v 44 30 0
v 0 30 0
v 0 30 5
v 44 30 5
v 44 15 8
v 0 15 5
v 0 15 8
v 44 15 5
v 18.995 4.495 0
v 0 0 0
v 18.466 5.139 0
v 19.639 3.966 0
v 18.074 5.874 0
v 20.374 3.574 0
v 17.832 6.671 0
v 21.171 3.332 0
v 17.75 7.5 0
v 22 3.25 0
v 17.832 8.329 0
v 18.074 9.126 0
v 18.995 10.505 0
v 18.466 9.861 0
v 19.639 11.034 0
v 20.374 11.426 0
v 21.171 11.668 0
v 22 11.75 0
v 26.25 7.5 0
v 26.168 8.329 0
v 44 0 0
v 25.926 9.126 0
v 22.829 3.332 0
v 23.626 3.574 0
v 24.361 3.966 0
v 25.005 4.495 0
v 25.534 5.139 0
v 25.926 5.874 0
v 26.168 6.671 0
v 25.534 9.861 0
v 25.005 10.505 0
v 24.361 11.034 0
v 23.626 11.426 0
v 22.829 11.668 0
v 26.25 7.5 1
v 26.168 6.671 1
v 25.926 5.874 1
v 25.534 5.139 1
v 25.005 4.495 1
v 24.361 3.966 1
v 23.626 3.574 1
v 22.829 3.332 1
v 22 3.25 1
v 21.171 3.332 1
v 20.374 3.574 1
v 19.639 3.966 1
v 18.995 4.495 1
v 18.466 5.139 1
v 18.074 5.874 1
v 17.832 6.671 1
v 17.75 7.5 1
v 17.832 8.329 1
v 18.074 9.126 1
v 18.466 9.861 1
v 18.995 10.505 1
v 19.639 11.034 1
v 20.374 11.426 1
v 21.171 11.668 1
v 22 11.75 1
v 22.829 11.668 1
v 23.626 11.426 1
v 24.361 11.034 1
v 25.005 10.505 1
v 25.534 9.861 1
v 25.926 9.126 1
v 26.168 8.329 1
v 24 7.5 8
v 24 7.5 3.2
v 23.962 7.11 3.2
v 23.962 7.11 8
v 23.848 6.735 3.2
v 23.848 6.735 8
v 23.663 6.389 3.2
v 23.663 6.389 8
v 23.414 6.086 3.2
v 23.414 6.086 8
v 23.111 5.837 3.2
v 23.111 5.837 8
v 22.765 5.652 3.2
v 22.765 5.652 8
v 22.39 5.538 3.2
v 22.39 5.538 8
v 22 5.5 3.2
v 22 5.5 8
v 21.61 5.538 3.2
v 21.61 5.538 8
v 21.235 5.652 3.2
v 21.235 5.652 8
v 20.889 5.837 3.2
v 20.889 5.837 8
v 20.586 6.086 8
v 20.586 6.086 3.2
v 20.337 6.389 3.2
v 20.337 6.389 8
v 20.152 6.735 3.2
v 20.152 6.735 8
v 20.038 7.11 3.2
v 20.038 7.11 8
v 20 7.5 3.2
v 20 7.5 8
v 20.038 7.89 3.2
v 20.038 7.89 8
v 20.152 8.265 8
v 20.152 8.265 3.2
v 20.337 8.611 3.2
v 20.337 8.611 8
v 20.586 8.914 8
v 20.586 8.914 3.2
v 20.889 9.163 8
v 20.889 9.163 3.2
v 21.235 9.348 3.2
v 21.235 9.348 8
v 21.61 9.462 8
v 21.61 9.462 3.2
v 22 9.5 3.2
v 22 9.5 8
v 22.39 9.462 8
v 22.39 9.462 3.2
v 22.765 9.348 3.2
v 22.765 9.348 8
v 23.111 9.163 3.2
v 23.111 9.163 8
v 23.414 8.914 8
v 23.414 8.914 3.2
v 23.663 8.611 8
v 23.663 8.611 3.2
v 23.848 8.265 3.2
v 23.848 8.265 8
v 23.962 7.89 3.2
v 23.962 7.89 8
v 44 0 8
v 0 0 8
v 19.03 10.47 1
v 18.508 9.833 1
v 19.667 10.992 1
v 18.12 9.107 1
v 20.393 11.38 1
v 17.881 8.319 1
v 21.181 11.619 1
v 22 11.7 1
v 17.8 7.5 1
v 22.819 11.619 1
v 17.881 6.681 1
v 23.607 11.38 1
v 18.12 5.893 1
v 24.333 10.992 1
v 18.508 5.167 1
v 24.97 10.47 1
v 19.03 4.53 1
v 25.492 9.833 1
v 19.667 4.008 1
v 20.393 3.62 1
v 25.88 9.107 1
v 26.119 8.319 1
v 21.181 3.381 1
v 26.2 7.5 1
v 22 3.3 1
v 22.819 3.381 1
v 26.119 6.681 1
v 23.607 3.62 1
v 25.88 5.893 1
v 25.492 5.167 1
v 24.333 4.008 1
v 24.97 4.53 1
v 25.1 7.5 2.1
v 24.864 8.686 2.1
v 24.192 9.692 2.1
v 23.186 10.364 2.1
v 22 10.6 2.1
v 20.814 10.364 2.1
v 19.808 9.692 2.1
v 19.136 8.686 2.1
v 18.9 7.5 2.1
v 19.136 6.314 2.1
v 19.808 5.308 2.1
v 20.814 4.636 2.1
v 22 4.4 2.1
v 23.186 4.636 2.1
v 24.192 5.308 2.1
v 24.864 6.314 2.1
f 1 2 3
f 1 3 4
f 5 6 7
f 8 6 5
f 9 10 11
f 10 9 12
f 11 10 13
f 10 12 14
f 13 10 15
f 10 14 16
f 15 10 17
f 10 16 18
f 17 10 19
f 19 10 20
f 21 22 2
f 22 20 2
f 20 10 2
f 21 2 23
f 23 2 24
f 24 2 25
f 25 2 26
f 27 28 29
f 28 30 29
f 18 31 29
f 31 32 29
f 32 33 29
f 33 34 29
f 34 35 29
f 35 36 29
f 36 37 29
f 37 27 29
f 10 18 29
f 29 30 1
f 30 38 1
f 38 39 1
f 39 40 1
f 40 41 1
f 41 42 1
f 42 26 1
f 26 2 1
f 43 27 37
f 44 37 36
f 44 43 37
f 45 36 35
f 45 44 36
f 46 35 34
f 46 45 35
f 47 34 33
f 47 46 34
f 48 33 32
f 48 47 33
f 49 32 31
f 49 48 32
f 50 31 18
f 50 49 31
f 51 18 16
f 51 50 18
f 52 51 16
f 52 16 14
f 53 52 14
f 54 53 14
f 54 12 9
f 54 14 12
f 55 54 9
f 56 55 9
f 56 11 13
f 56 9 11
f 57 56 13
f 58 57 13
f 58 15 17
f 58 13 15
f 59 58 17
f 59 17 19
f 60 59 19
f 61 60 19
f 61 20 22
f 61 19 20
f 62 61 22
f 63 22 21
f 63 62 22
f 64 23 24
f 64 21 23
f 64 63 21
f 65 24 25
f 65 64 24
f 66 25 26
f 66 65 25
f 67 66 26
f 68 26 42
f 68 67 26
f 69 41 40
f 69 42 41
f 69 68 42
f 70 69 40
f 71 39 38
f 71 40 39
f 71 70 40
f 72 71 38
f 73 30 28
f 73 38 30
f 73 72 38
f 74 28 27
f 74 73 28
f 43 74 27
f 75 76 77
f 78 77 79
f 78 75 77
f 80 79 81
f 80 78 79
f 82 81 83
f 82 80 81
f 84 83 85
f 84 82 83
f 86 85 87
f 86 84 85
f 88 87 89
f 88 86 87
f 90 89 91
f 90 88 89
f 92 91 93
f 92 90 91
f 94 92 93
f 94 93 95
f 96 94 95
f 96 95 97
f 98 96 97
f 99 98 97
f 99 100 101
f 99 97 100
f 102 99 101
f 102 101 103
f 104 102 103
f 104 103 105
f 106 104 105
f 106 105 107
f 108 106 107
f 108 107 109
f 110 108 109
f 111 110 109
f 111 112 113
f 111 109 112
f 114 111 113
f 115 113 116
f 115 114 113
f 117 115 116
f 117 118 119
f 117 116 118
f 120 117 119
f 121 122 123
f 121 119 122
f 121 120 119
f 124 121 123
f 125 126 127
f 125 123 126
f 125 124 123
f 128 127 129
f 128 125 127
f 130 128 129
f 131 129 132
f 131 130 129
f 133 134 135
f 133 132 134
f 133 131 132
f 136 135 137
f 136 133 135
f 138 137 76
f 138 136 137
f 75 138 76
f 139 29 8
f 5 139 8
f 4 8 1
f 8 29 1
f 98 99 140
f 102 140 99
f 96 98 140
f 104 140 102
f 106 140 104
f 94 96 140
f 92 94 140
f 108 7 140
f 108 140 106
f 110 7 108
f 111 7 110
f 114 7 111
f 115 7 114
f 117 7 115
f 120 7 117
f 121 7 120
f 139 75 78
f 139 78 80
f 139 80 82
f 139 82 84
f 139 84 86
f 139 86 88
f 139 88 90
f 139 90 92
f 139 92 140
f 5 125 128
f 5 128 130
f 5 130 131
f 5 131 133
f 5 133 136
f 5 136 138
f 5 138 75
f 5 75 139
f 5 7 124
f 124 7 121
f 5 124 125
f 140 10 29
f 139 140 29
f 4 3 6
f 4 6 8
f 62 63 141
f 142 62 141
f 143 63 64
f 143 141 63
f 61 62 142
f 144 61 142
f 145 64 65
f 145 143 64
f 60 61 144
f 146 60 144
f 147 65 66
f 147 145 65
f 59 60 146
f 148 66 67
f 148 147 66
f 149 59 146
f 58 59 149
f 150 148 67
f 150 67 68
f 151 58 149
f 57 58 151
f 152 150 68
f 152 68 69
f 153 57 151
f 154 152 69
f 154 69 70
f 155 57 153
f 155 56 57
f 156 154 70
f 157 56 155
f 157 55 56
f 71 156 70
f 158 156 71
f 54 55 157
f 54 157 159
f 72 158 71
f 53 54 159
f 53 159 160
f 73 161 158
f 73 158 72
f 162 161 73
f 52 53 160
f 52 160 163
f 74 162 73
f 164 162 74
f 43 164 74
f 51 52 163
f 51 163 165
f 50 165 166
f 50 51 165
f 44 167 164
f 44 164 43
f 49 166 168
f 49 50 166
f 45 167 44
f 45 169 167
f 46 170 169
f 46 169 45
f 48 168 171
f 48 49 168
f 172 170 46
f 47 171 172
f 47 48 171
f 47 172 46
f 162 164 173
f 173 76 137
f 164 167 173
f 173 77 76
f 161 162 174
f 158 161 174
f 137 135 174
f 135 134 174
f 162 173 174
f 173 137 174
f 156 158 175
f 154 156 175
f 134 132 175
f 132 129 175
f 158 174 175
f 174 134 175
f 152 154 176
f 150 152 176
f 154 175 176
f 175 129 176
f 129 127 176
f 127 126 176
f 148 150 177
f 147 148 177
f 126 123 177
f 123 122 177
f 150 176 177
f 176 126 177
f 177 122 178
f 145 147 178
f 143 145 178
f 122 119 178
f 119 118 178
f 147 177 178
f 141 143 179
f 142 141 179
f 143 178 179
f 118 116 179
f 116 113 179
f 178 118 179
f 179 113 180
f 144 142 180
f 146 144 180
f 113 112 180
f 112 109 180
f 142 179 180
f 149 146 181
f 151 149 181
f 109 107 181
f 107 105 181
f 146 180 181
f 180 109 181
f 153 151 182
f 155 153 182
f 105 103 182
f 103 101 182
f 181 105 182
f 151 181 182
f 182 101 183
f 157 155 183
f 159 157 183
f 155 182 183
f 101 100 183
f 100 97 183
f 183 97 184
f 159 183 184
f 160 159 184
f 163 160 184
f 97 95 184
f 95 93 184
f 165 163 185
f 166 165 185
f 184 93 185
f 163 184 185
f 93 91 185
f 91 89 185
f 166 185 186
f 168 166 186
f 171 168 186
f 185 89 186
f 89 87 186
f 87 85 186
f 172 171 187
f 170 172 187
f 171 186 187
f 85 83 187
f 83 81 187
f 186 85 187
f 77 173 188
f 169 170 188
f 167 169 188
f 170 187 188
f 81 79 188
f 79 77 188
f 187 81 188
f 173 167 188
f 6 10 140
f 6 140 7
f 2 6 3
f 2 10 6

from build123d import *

# Parameters (mm, degrees)
CYLINDER007_R             = 4.25
CYLINDER007_DEPTH         = 10
CYLINDER008_R             = 2
CYLINDER008_DEPTH         = 10
FUSION008_PLACEMENT_ANGLE = 180
CYLINDER009_R             = 4.25
CYLINDER009_DEPTH         = 8
CYLINDER001_R             = 4.25
CYLINDER001_DEPTH         = 10
CYLINDER_R                = 2
CYLINDER_DEPTH            = 10
BOX001_W                  = 44
BOX001_H                  = 15
BOX001_DEPTH              = 8
BOX_W                     = 44
BOX_H                     = 30
BOX_DEPTH                 = 5
CHAMFER_SIZE              = 2.2
CHAMFER003_SIZE           = 2.2


with BuildPart() as cylinder007:
    # Cylinder007 → Cylinder007 (new body)
    with BuildSketch(Plane(origin=(22, 7.5, 7), x_dir=(1, 0, 0), z_dir=(0, 0, 1))):
        Circle(CYLINDER007_R)
    extrude(amount=CYLINDER007_DEPTH)


with BuildPart() as fusion008:
    # Cylinder008 → Cylinder008 (new body)
    with BuildSketch(Plane(origin=(22, 7.5, 0), x_dir=(1, 0, 0), z_dir=(0, 0, 1))):
        Circle(CYLINDER008_R)
    extrude(amount=CYLINDER008_DEPTH)

    # Fusion008: union Cylinder007
    add(cylinder007.part)


with BuildPart() as fusion008_1:
    # Fusion008 placement: moved
    add(fusion008.part.moved(Location((0, 15, 8))).rotate(Axis((0, 15, 8), (1, 0, 0)), FUSION008_PLACEMENT_ANGLE))


with BuildPart() as cylinder009:
    # Cylinder009 → Cylinder009 (new body)
    with BuildSketch(Plane(origin=(22, 7.5, 0), x_dir=(1, 0, 0), z_dir=(0, 0, 1))):
        Circle(CYLINDER009_R)
    extrude(amount=CYLINDER009_DEPTH)


with BuildPart() as cylinder001:
    # Cylinder001 → Cylinder001 (new body)
    with BuildSketch(Plane(origin=(22, 7.5, 7), x_dir=(1, 0, 0), z_dir=(0, 0, 1))):
        Circle(CYLINDER001_R)
    extrude(amount=CYLINDER001_DEPTH)


with BuildPart() as fusion001:
    # Cylinder → Cylinder (new body)
    with BuildSketch(Plane(origin=(22, 7.5, 0), x_dir=(1, 0, 0), z_dir=(0, 0, 1))):
        Circle(CYLINDER_R)
    extrude(amount=CYLINDER_DEPTH)

    # Fusion001: union Cylinder001
    add(cylinder001.part)


with BuildPart() as cube001:
    # Box001 → Box001 (new body)
    with BuildSketch(Plane.XY):
        with Locations((22, 7.5)):
            Rectangle(BOX001_W, BOX001_H)
    extrude(amount=BOX001_DEPTH)


with BuildPart() as chamfer003:
    # Box → Box (new body)
    with BuildSketch(Plane.XY):
        with Locations((22, 15)):
            Rectangle(BOX_W, BOX_H)
    extrude(amount=BOX_DEPTH)

    # Fusion: union Cube001
    add(cube001.part)

    # Cut: cut Fusion001
    add(fusion001.part, mode=Mode.SUBTRACT)

    # Chamfer
    chamfer_edges = [chamfer003.edges().sort_by_distance(p)[0] for p in [
        (20, 7.5, 7),
    ]]
    chamfer(chamfer_edges, length=CHAMFER_SIZE)

    # Fusion009: union Cylinder009
    add(cylinder009.part)

    # Cut003: cut Fusion008
    add(fusion008_1.part, mode=Mode.SUBTRACT)

    # Chamfer003
    chamfer003_edges = [chamfer003.edges().sort_by_distance(p)[0] for p in [
        (20, 7.5, 1),
    ]]
    chamfer(chamfer003_edges, length=CHAMFER003_SIZE)


solid = chamfer003.part
